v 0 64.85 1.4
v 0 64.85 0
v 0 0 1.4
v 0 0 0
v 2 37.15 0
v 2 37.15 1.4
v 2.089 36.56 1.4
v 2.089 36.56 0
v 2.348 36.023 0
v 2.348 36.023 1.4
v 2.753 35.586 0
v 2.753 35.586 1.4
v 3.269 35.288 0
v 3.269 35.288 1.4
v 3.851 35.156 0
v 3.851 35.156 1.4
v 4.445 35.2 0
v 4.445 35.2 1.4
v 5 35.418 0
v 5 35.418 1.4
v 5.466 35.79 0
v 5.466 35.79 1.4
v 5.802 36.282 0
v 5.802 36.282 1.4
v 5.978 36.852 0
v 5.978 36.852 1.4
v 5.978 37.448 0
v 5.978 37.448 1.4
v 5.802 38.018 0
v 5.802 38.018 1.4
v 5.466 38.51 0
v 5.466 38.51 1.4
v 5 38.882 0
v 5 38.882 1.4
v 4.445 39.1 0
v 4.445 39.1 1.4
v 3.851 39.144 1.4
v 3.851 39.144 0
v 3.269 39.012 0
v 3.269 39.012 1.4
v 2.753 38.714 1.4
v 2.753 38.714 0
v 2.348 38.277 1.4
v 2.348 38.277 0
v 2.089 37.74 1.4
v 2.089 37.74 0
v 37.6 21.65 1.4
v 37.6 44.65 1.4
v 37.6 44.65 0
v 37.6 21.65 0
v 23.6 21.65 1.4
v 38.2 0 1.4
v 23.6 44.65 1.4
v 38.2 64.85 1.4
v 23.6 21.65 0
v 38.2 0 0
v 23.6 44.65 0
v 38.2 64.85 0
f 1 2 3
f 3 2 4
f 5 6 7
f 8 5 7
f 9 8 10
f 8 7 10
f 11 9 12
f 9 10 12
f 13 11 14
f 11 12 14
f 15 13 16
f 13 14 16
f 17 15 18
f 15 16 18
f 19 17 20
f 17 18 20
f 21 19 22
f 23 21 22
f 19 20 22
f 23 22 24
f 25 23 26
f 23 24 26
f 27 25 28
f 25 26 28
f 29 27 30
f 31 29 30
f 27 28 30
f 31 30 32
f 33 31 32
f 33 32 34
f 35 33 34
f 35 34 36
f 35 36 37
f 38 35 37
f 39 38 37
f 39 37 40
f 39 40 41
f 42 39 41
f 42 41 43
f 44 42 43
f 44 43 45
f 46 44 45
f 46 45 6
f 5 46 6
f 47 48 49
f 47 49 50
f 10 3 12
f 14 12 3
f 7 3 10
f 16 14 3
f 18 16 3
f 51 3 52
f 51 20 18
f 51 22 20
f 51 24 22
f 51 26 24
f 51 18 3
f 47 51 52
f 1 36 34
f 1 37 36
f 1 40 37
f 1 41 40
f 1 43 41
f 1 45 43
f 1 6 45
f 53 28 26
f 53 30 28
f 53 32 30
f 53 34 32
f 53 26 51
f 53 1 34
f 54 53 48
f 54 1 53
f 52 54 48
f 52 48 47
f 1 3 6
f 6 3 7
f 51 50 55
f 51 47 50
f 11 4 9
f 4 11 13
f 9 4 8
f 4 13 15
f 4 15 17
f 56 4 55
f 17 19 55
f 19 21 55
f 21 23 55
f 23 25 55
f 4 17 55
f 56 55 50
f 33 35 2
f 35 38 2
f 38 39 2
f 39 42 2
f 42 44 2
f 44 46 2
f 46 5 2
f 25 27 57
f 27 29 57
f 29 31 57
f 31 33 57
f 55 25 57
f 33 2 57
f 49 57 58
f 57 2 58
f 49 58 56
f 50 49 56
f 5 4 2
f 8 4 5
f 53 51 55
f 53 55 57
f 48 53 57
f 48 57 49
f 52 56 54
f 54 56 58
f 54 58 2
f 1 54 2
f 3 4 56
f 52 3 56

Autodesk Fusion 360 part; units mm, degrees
sketch "Sketch1" plane through (0, 0, 0) normal (0, 0, 1) x (1, 0, 0)
  line L0 (0, 0) -> (38.2, 0)
  line L1 (38.2, 0) -> (38.2, 66.3)
  line L2 (38.2, 66.3) -> (0, 66.3)
  line L3 (0, 66.3) -> (0, 0)
  dimension "d1" = 38.2
  dimension "d2" = 66.3
extrude "Extrude1" add sketch "Sketch1" along normal blind 1.3
sketch "Sketch2" plane through (0, 0, 1.3) normal (0, 0, 1) x (-1, 0, 0)
  line L0 (0, -66.3) -> (0, 0)
  line L1 (0, 0) -> (-38.2, 0)
  line L2 (-38.2, 0) -> (-38.2, -66.3)
  line L3 (-38.2, -66.3) -> (0, -66.3)
  line L4 (-0.6, -63.65) -> (-37.6, -63.65)
  line L5 (-37.6, -63.65) -> (-37.6, -2.65)
  line L6 (-37.6, -2.65) -> (-0.6, -2.65)
  line L7 (-0.6, -2.65) -> (-0.6, -63.65)
  line L8 (-37.6, -21.65) -> (-23.6, -21.65)
  line L9 (-23.6, -21.65) -> (-23.6, -44.65)
  line L10 (-23.6, -44.65) -> (-37.6, -44.65)
  line L11 (-37.6, -44.65) -> (-37.6, -21.65)
  line L12 (-0.6, -37.15) -> (-4, -37.15) construction
  circle A0 centre (-4, -37.15) radius 1.5
  dimension "d5" = 37
  dimension "d6" = 61
  dimension "d7" = 2.65
  dimension "d8" = 0.6
  dimension "d9" = 14
  dimension "d10" = 19
  dimension "d11" = 19
  dimension "d12" = 26.5
  dimension "d13" = 3
extrude "Extrude2" cut sketch "Sketch2" against normal blind 78 contours A0
extrude "Extrude3" cut sketch "Sketch2" against normal blind 2 contours L5 L8 L9 L10 L11
extrude "Extrude4" cut 1 faces at (25.4667, 66.3, 0.4333) along direction (0, -1, 0) blind 0.95
extrude "Extrude5" add 1 faces at (20.6, 7.2167, 1.3) along direction (0, 0, 1) blind 0.1
extrude "Extrude6" cut 1 faces at (25.4667, 65.35, 0.4667) along direction (0, -1, 0) blind 0.5
sketch "Sketch3" plane through (0, 0, 1.4) normal (0, 0, 1) x (-1, 0, 0)
  line L0 (-23.6, -21.65) -> (-23.6, -44.65)
  line L1 (-23.6, -44.65) -> (-37.6, -44.65)
  line L2 (-37.6, -44.65) -> (-37.6, -21.65)
  line L3 (-37.6, -21.65) -> (-23.6, -21.65)
  circle A0 centre (-4, -37.15) radius 1.5
  line L4 (-38.2, -64.85) -> (0, -64.85)
  line L5 (0, -64.85) -> (0, 0)
  line L6 (0, 0) -> (-38.2, 0)
  line L7 (-38.2, 0) -> (-38.2, -64.85)
  circle A1 centre (-4, -37.15) radius 2
  dimension "d24" = 4
extrude "Extrude7" cut sketch "Sketch3" against normal blind 4 contours A1
equation "d18 = -2.65 mm + 1.7 mm"
